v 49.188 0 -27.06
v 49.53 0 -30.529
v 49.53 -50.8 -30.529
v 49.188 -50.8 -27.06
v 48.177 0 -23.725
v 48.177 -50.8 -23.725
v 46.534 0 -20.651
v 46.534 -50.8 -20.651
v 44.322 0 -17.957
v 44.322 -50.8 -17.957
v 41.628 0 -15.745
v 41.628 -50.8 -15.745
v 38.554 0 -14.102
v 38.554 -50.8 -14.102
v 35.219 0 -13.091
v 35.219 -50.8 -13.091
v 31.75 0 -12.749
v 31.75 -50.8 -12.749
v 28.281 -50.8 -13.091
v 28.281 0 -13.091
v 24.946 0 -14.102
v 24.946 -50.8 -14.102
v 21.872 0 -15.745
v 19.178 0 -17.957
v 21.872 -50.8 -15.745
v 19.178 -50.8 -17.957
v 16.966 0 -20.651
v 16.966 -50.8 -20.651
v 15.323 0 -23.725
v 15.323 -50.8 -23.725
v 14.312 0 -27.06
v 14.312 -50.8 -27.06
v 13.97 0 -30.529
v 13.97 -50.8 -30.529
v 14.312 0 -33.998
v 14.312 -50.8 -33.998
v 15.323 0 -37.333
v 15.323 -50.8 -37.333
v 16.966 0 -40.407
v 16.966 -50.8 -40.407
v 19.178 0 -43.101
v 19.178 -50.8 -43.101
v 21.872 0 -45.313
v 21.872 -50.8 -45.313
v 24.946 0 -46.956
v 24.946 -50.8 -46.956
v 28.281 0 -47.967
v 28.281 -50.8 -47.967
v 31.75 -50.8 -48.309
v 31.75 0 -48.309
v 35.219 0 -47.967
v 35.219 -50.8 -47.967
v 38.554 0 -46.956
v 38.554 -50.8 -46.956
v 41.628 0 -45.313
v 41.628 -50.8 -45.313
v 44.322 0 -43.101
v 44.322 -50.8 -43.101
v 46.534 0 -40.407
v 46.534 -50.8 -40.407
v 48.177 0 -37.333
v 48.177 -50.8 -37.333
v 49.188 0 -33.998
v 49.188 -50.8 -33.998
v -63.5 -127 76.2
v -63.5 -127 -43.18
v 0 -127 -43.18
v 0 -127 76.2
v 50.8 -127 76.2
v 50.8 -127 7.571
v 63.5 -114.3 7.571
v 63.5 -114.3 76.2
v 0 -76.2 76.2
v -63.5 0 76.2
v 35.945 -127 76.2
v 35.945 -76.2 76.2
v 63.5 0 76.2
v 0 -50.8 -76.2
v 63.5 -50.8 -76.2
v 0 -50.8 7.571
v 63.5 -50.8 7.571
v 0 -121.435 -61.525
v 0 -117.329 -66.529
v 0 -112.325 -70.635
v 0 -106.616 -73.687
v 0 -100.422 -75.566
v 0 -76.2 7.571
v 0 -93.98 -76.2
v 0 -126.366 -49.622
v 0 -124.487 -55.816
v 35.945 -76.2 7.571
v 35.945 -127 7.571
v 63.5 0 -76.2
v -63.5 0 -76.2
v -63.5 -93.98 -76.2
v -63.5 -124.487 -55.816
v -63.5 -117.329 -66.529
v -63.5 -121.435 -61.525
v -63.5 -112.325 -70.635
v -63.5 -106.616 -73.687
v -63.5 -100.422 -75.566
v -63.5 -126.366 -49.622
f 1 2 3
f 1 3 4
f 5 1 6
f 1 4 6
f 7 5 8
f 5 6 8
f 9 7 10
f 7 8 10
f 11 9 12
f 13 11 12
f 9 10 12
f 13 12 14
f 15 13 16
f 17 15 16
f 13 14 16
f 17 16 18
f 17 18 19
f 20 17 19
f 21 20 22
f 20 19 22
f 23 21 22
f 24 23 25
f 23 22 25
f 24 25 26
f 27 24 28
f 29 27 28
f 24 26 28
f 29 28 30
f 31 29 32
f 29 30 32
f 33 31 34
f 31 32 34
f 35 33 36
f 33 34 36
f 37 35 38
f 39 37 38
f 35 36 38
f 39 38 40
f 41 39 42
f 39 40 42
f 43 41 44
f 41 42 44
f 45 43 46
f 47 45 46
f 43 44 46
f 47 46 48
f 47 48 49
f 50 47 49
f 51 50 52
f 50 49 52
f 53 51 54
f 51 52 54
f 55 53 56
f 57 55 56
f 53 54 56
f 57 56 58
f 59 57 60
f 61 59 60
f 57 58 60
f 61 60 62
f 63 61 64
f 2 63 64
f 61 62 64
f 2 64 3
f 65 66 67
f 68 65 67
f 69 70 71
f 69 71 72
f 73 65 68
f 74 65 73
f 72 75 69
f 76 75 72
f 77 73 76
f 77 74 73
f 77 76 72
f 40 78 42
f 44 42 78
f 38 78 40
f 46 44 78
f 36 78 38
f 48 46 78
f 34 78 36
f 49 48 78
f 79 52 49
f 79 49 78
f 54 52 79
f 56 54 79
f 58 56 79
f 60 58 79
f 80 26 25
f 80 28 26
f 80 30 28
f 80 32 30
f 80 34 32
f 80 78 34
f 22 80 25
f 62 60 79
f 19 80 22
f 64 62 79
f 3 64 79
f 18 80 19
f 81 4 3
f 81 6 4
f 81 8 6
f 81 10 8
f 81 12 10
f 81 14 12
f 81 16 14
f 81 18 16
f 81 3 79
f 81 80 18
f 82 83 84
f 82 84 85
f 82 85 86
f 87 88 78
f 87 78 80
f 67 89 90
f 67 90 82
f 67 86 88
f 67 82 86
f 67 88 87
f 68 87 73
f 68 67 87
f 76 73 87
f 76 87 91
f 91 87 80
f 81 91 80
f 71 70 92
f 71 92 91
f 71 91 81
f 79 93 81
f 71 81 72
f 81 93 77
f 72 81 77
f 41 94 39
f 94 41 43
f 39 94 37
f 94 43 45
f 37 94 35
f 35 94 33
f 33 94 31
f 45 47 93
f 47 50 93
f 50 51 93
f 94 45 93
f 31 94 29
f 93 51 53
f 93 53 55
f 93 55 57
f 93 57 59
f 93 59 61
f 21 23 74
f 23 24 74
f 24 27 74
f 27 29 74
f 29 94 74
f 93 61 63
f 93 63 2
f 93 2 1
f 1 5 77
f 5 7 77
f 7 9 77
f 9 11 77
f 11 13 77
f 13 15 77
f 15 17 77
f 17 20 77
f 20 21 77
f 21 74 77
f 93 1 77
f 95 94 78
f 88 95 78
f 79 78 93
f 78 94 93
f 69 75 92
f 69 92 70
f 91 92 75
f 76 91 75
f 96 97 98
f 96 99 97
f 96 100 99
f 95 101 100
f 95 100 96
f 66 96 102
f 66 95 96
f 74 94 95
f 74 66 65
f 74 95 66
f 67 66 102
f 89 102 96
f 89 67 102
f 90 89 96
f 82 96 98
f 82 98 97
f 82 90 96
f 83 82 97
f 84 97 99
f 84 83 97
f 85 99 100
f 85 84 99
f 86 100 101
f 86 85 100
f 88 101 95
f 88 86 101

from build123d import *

# Parameters (mm, degrees)
F0_W     = 127
F0_H     = 152.4
F1_DEPTH = 127
F2_W     = 63.5
F2_H     = 83.7710094534
F3_DEPTH = 76.2
F4_R     = 17.78
F5_DEPTH = 50.8
F6_W     = 35.9447933733
F6_H     = 68.6289905466
F7_DEPTH = 50.8
F8_R     = 33.02
F9_SIZE  = 12.7


with BuildPart() as f1:
    # F0 (on Front) → F1 (new body)
    with BuildSketch(Plane.XZ):
        Rectangle(F0_W, F0_H)
    extrude(amount=F1_DEPTH)

    # F2 (on face) → F3 (cut)
    with BuildSketch(Plane.XZ.offset(127)):
        with Locations((31.75, -34.3144952733)):
            Rectangle(F2_W, F2_H)
    extrude(amount=-F3_DEPTH, mode=Mode.SUBTRACT)

    # F4 (on face) → F5 (cut, through all)
    with BuildSketch(Plane.XZ.offset(50.8)):
        with Locations((31.75, -30.5289905466)):
            Circle(F4_R)
    extrude(amount=-F5_DEPTH, mode=Mode.SUBTRACT)

    # F6 (on face) → F7 (cut)
    with BuildSketch(Plane.XZ.offset(127)):
        with Locations((17.9723966867, 41.8855047267)):
            Rectangle(F6_W, F6_H)
    extrude(amount=-F7_DEPTH, mode=Mode.SUBTRACT)

    # F8
    f8_edges = [f1.edges().sort_by_distance(p)[0] for p in [
        (-31.75, -127, -76.2),
    ]]
    fillet(f8_edges, radius=F8_R)

    # F9
    f9_edges = [f1.edges().sort_by_distance(p)[0] for p in [
        (63.5, -127, 41.885505),
    ]]
    chamfer(f9_edges, length=F9_SIZE)


solid = f1.part
